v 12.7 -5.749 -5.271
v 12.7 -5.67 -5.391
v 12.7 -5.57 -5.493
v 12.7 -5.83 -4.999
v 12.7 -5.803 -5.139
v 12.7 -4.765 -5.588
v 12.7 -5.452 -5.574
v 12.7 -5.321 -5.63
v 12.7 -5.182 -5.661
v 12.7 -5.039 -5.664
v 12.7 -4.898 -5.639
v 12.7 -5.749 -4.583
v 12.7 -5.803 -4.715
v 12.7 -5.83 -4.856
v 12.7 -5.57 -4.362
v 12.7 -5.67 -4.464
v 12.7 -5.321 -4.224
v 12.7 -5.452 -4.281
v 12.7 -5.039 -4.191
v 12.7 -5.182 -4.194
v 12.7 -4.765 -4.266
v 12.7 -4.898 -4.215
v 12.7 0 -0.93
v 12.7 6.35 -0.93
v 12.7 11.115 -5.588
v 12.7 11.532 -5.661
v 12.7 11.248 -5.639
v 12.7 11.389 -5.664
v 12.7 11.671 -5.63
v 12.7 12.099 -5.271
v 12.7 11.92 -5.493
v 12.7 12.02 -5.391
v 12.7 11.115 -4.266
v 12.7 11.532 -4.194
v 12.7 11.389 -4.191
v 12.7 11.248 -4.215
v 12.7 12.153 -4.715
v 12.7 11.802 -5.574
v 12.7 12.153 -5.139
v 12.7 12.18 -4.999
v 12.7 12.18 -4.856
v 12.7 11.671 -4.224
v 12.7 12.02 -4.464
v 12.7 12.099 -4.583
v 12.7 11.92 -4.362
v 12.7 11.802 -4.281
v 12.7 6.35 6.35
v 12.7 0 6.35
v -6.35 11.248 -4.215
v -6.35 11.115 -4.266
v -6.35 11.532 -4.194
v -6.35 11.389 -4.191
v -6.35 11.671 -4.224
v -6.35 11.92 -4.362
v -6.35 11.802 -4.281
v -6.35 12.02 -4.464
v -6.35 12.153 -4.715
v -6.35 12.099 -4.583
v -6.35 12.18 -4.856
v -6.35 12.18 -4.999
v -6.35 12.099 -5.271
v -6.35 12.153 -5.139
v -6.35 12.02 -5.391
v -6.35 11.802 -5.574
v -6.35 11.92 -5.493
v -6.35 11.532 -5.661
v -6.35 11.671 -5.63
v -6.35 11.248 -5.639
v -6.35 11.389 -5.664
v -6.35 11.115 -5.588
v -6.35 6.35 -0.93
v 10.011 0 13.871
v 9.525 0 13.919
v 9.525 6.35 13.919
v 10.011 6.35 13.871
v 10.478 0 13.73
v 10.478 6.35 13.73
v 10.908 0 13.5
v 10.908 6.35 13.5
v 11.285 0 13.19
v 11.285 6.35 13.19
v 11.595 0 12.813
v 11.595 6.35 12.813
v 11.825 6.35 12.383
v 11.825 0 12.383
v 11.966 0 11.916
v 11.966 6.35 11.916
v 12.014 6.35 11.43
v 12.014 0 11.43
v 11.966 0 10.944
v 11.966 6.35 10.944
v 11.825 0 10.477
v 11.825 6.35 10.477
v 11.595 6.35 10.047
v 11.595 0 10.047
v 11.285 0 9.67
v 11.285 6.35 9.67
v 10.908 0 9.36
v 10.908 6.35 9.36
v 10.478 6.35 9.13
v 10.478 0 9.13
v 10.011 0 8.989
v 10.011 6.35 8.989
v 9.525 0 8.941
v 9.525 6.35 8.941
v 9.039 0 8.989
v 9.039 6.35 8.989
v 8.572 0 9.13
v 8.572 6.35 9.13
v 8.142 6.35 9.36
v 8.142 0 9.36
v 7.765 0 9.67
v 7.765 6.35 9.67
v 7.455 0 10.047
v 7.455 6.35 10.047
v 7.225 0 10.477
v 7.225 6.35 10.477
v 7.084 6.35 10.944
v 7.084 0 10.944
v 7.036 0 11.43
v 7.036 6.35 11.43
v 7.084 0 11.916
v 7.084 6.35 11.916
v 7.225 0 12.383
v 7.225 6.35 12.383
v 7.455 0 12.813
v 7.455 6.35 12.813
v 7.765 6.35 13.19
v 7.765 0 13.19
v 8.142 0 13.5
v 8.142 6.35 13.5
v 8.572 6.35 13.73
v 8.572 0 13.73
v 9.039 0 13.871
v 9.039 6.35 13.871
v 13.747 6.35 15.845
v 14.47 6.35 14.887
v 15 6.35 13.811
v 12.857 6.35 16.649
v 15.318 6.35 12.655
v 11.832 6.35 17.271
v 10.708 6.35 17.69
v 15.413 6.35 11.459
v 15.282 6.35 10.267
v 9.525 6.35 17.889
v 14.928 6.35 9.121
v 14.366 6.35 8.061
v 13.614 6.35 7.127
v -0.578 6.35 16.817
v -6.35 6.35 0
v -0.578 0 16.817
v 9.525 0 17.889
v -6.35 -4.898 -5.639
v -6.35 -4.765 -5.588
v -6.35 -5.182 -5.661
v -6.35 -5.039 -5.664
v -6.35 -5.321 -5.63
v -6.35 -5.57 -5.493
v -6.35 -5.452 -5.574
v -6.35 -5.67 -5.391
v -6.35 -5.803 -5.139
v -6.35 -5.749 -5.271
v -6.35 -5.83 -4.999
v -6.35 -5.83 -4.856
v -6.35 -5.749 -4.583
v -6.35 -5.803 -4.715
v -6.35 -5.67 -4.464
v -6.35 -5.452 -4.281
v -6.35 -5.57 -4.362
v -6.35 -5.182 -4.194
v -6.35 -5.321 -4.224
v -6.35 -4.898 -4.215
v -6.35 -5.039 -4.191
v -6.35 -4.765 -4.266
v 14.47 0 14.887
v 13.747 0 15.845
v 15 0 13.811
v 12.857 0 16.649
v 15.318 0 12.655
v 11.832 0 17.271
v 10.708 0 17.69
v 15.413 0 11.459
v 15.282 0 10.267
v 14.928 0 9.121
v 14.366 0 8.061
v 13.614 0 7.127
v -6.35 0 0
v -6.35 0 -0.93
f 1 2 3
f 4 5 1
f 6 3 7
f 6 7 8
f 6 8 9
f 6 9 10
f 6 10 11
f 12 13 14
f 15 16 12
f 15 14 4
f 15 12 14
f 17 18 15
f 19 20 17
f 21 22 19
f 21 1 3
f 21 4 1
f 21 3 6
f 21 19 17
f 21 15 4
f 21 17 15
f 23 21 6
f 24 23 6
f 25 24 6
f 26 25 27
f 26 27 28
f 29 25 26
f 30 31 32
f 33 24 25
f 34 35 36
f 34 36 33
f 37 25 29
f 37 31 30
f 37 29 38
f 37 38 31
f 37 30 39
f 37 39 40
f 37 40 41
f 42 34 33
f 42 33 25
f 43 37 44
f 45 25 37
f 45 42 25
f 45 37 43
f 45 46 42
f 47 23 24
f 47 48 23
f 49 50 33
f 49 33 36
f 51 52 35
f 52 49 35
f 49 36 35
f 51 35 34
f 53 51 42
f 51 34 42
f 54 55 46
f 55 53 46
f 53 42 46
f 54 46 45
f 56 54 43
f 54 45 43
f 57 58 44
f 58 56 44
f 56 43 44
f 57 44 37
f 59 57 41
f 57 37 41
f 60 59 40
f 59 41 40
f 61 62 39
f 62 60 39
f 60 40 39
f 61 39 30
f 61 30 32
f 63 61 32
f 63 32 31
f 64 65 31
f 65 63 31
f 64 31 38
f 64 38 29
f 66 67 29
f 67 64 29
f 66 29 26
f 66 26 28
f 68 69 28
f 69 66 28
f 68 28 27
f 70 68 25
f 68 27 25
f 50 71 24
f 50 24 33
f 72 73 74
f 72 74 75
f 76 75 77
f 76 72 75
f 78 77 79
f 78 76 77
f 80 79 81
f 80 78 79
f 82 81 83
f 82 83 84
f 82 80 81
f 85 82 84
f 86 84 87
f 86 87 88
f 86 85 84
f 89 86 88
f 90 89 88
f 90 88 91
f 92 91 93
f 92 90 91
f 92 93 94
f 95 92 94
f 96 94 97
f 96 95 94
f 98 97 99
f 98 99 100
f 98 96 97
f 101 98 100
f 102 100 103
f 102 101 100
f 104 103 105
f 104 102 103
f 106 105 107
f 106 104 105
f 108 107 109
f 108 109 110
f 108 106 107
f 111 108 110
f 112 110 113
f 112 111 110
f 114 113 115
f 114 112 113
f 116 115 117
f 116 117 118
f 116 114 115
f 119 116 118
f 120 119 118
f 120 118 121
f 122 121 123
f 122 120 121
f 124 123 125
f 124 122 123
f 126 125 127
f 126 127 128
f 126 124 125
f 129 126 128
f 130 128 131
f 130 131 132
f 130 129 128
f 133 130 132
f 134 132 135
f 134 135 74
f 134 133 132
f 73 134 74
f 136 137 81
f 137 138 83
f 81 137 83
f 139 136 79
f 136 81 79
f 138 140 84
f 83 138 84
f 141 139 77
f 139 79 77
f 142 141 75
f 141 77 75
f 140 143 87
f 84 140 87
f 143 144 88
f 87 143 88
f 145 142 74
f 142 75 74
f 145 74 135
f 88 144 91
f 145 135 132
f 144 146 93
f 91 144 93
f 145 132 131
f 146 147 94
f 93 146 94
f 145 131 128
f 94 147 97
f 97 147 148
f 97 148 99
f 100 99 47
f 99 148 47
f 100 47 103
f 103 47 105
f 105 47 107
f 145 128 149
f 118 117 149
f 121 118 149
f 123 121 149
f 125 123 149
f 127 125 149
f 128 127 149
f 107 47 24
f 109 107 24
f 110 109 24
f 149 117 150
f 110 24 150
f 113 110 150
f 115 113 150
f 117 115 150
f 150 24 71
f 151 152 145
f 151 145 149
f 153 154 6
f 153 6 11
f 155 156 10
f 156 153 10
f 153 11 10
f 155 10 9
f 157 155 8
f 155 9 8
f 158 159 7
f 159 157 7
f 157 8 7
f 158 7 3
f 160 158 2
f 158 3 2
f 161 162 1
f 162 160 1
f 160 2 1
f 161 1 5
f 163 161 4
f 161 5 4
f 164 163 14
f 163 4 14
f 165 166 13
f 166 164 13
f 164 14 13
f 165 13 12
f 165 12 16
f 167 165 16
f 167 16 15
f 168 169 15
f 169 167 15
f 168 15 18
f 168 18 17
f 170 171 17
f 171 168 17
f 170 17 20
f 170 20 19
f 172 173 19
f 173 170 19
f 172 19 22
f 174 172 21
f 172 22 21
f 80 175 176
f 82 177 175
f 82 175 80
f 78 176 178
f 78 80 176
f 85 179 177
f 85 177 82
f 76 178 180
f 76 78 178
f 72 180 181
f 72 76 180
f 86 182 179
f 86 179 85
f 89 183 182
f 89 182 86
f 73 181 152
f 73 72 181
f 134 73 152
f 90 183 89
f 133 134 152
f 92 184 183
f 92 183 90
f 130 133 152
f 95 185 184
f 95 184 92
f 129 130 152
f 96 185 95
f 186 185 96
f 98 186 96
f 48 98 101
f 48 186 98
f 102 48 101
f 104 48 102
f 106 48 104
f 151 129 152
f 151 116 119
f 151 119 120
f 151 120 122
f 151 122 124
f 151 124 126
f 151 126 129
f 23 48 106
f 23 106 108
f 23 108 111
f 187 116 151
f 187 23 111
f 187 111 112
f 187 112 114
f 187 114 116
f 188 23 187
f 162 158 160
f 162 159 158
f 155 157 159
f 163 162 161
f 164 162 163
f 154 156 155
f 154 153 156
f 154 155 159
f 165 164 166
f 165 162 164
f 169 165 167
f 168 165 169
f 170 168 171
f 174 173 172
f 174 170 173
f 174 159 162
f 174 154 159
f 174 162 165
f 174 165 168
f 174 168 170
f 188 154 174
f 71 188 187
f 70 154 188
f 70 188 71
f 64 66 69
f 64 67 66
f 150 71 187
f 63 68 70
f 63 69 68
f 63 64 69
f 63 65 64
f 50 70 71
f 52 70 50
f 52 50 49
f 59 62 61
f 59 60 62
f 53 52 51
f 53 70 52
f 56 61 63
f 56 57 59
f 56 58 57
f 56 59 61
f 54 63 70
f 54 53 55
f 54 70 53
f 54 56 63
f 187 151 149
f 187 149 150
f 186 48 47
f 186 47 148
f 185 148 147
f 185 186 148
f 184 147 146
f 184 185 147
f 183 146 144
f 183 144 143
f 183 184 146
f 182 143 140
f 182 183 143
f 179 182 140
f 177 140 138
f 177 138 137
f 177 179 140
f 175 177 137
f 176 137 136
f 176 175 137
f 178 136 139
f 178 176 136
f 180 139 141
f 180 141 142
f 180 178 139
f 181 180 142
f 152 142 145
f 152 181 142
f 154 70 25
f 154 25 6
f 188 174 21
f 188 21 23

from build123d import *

# Parameters (mm, degrees)
SKETCH1_R               = 2.4892
BOSS_EXTRUDE1_DEPTH     = 6.35
BOSS_EXTRUDE2_START     = -6.35
BOSS_EXTRUDE2_DEPTH     = 19.05
BOSS_EXTRUDE2_START_2   = -6.555460136
BOSS_EXTRUDE2_2_DEPTH   = 19.460920272
BOSS_EXTRUDE2_START_3   = -10
BOSS_EXTRUDE2_3_DEPTH   = 3.65
CUT_EXTRUDE1_DEPTH      = 27.910448217
CUT_EXTRUDE1_DEPTH_BACK = 27.910448217
SKETCH3_W               = 2.179354936
SKETCH3_H               = 6.35
CUT_EXTRUDE2_DEPTH      = 31.98795935
CUT_EXTRUDE2_DEPTH_BACK = 31.98795935


with BuildPart() as part:
    # Sketch1 → Boss-Extrude1 (new body)
    with BuildSketch(Plane(origin=(0, 0, 0), x_dir=(1, 0, 0), z_dir=(0, 1, 0))):
        with BuildLine():
            Line((9.525, -17.889269346), (-0.578271622, -16.817120786))
            Line((-0.578271622, -16.817120786), (-6.35, 0))
            Line((-6.35, 0), (12.7, 0))
            Line((12.7, 0), (12.7, -6.35))
            ThreePointArc((12.7, -6.35), (15.186560179, -13.240601753), (9.525, -17.889269346))
        make_face()
        with Locations(Location((9.525, -11.43, 0), (0, 0, 270))):
            Circle(SKETCH1_R, mode=Mode.SUBTRACT)
    extrude(amount=BOSS_EXTRUDE1_DEPTH)

    # Boss-Extrude2: read off the stored shape, not the designer's step
    # Boss-Extrude2 outline → Boss-Extrude2 (add)
    with BuildSketch(Plane.YZ.offset(BOSS_EXTRUDE2_START)):
        with BuildLine():
            ThreePointArc((11.551615481, -6.35), (12.905510296, -4.996105185), (11.551615481, -3.642210371))
            Line((11.551615481, -3.642210371), (6.35, 0))
            Line((6.35, 0), (0, 0))
            Line((0, 0), (-5.201615481, -3.642210371))
            ThreePointArc((-5.201615481, -3.642210371), (-6.555510296, -4.996105185), (-5.201615481, -6.35))
            Line((-5.201615481, -6.35), (11.551615481, -6.35))
        make_face()
    extrude(amount=BOSS_EXTRUDE2_DEPTH)

    # Boss-Extrude2 2 outline → Boss-Extrude2 2 (add)
    with BuildSketch(Plane(origin=(0, 0, 0), x_dir=(1, 0, 0), z_dir=(0, 1, 0)).offset(BOSS_EXTRUDE2_START_2)):
        Polygon((-8.529354936, 6.35), (-6.35, 0), (-6.35, 6.35), align=None)
    extrude(amount=BOSS_EXTRUDE2_2_DEPTH)

    # Boss-Extrude2 3 outline → Boss-Extrude2 3 (cut)
    with BuildSketch(Plane.YZ.offset(BOSS_EXTRUDE2_START_3)):
        with BuildLine():
            Line((12.905460136, 0), (6.35, 0))
            Line((6.35, 0), (11.551615481, -3.642210371))
            ThreePointArc((11.551615481, -3.642210371), (12.504834401, -4.034645431), (12.905460136, -4.984450993))
            Line((12.905460136, -4.984450993), (12.905460136, 0))
        make_face()
        with BuildLine():
            ThreePointArc((12.905460136, -5.007759378), (12.504834401, -5.95756494), (11.551615481, -6.35))
            Line((11.551615481, -6.35), (12.905460136, -6.35))
            Line((12.905460136, -6.35), (12.905460136, -5.007759378))
        make_face()
        with BuildLine():
            Line((0, 0), (-6.555460136, 0))
            Line((-6.555460136, 0), (-6.555460136, -4.984450993))
            ThreePointArc((-6.555460136, -4.984450993), (-6.154834401, -4.034645431), (-5.201615481, -3.642210371))
            Line((-5.201615481, -3.642210371), (0, 0))
        make_face()
        with BuildLine():
            ThreePointArc((-5.201615481, -6.35), (-6.154834401, -5.95756494), (-6.555460136, -5.007759378))
            Line((-6.555460136, -5.007759378), (-6.555460136, -6.35))
            Line((-6.555460136, -6.35), (-5.201615481, -6.35))
        make_face()
    extrude(amount=BOSS_EXTRUDE2_3_DEPTH, mode=Mode.SUBTRACT)

    # Sketch3 → Cut-Extrude1 (cut, two sides: drawn at the far end of the back side and taken through both)
    with BuildSketch(Plane.XZ.offset(-CUT_EXTRUDE1_DEPTH_BACK)):
        with Locations((-7.439677468, -3.175)):
            Rectangle(SKETCH3_W, SKETCH3_H)
    extrude(amount=CUT_EXTRUDE1_DEPTH + CUT_EXTRUDE1_DEPTH_BACK, mode=Mode.SUBTRACT)

    # Sketch4 → Cut-Extrude2 (cut, two sides: drawn at the far end of the back side and taken through both)
    with BuildSketch(Plane.ZY.offset(6.35).offset(-CUT_EXTRUDE2_DEPTH_BACK)):
        with BuildLine():
            ThreePointArc((-5.588, -4.764550237), (-4.927202114, -5.833718802), (-4.266404229, -4.764550237))
            Line((-4.266404229, -4.764550237), (-0.930230237, 0))
            Line((-0.930230237, 0), (0, 0))
            Line((0, 0), (-3.642210371, -5.201615481))
            ThreePointArc((-3.642210371, -5.201615481), (-4.996105185, -6.555510296), (-6.35, -5.201615481))
            Line((-6.35, -5.201615481), (-6.35, 11.551615481))
            ThreePointArc((-6.35, 11.551615481), (-4.996105185, 12.905510296), (-3.642210371, 11.551615481))
            Line((-3.642210371, 11.551615481), (0, 6.35))
            Line((0, 6.35), (-0.930230237, 6.35))
            Line((-0.930230237, 6.35), (-4.266404229, 11.114550237))
            ThreePointArc((-4.266404229, 11.114550237), (-4.927202114, 12.183718802), (-5.588, 11.114550237))
            Line((-5.588, 11.114550237), (-5.588, -4.764550237))
        make_face()
    extrude(amount=CUT_EXTRUDE2_DEPTH + CUT_EXTRUDE2_DEPTH_BACK, mode=Mode.SUBTRACT)


solid = part.part
